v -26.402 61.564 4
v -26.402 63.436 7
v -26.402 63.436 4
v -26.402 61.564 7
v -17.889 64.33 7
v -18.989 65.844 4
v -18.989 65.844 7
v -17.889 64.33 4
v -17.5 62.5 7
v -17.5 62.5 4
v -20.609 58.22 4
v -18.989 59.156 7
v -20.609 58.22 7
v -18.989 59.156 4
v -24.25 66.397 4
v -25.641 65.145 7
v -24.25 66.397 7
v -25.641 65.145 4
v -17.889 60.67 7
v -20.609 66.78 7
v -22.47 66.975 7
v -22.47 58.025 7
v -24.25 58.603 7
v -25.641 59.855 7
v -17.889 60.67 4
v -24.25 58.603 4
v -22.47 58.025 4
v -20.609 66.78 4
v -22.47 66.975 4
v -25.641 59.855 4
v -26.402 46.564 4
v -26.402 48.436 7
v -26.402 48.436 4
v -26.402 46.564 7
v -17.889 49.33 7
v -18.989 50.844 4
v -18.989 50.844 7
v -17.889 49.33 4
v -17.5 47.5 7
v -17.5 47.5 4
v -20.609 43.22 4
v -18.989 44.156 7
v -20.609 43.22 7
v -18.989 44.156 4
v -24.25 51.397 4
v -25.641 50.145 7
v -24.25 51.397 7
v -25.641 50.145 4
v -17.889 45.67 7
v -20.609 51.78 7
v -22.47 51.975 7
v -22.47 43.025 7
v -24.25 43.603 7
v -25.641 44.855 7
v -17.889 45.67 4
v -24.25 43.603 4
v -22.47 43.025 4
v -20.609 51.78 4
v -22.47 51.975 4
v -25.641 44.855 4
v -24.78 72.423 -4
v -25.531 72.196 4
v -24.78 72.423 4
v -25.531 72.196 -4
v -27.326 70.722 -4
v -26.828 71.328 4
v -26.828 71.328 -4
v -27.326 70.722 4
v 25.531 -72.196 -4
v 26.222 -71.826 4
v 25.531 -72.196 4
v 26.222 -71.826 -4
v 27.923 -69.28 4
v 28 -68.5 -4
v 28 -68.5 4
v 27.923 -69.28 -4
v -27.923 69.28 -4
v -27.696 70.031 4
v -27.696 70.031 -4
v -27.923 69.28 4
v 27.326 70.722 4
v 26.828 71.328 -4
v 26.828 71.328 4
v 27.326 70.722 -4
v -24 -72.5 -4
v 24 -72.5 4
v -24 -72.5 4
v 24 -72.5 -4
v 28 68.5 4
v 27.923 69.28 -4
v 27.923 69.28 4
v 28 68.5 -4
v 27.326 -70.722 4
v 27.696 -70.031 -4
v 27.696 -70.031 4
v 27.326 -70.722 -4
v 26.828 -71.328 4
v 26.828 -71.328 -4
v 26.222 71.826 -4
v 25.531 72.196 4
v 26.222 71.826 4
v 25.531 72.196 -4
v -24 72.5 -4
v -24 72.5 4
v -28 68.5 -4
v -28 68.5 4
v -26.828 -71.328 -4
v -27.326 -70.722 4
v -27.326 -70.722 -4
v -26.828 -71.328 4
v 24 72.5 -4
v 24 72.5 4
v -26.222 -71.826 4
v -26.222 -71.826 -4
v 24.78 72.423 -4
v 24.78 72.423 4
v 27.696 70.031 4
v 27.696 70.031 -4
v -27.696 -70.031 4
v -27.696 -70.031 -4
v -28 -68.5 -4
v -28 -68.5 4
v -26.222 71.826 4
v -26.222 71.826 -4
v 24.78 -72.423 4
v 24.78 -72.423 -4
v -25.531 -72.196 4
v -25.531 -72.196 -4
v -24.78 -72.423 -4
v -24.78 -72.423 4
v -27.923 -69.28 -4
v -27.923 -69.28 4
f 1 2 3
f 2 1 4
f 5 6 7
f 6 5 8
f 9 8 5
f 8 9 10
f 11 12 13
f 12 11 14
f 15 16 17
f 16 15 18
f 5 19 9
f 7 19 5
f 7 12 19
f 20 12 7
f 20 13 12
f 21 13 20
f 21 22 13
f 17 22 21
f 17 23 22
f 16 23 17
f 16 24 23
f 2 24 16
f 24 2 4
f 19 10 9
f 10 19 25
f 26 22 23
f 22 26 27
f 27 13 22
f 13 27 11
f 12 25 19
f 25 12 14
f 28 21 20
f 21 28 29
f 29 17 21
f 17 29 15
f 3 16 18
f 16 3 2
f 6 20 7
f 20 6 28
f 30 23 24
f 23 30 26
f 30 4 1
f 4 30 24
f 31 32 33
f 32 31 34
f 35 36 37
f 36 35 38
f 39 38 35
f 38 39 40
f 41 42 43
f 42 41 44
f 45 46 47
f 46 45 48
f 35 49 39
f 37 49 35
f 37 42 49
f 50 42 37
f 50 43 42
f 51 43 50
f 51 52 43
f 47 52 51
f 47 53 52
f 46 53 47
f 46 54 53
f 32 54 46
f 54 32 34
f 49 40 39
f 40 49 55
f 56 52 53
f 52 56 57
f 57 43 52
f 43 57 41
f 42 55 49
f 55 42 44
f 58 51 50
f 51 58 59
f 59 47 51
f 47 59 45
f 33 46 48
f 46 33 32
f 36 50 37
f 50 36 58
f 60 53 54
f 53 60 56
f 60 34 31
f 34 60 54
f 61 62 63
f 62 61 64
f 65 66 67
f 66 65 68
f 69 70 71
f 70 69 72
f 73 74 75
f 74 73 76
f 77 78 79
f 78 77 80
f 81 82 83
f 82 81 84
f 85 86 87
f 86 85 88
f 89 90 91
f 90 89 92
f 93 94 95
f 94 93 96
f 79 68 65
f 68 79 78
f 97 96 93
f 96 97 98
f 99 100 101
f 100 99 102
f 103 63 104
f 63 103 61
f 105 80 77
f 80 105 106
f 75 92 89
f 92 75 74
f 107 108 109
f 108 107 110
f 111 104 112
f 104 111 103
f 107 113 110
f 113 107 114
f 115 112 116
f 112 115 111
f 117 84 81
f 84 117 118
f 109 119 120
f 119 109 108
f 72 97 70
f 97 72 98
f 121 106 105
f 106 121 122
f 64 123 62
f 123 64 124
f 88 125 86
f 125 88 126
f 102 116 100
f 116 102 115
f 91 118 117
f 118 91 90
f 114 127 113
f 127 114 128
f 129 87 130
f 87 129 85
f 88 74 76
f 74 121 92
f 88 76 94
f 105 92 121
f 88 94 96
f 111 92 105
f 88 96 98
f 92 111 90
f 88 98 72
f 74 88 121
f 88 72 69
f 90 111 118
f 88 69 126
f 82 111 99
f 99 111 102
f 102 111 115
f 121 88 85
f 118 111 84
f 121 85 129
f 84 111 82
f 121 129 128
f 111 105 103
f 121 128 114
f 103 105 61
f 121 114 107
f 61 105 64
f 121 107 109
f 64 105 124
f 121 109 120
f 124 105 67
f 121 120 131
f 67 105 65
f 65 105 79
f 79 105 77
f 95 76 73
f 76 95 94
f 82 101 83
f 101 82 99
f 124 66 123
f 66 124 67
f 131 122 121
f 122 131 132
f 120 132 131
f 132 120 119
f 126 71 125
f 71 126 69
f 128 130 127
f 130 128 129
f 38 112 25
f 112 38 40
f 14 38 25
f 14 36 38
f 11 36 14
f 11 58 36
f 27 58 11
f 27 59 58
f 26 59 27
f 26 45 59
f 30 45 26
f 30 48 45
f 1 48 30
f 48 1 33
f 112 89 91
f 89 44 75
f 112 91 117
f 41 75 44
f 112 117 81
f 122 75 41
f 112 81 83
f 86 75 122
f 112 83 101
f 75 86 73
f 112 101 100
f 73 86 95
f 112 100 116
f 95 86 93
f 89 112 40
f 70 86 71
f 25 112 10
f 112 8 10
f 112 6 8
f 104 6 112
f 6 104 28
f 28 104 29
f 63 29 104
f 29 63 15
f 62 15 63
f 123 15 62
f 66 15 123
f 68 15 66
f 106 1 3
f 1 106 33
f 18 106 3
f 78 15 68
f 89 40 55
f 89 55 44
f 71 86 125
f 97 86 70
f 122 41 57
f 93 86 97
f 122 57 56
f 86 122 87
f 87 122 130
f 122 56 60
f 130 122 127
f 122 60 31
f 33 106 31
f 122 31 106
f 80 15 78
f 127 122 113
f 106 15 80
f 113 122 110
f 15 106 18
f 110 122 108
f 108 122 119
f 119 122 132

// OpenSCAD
echo("Работа Вадима Разеева!");
len_phone=145;
width_phone=56;
thickness_phone=8;
corner_round=8;

//color("red")
//translate([0, 0, 10])
//cube([width_phone, len_phone, thickness_phone], center=true);

module smartphone() {
    smartphone_block();
    cameras_block();
}


module cameras_block() {
    color("blue")
    translate([width_phone/2-50, len_phone/2-10, 0])
    cylinder(d=9, h = thickness_phone - 1);

    color("blue")
    translate([width_phone/2-50, len_phone/2-25, 0])
    cylinder(d=9, h = thickness_phone - 1);
}

module smartphone_block(){
    hull() {
        color("red")
        translate([width_phone/2-corner_round/2, len_phone/2-corner_round/2, 0])
        cylinder(h=thickness_phone, d=corner_round, $fn=32, center=true);

        mirror([1,0,0])
        color("red")
        translate([width_phone/2-corner_round/2, len_phone/2-corner_round/2, 0])
        cylinder(h=thickness_phone, d=corner_round, $fn=32, center=true);

        mirror([0,1,0])
        color("red")
        translate([width_phone/2-corner_round/2, len_phone/2-corner_round/2, 0])
        cylinder(h=thickness_phone, d=corner_round, $fn=32, center=true);

        mirror([1,0,0])
        mirror([0,1,0])
        color("red")
        translate([width_phone/2-corner_round/2, len_phone/2-corner_round/2, 0])
        cylinder(h=thickness_phone, d=corner_round, $fn=32, center=true);
    }
}
smartphone();
